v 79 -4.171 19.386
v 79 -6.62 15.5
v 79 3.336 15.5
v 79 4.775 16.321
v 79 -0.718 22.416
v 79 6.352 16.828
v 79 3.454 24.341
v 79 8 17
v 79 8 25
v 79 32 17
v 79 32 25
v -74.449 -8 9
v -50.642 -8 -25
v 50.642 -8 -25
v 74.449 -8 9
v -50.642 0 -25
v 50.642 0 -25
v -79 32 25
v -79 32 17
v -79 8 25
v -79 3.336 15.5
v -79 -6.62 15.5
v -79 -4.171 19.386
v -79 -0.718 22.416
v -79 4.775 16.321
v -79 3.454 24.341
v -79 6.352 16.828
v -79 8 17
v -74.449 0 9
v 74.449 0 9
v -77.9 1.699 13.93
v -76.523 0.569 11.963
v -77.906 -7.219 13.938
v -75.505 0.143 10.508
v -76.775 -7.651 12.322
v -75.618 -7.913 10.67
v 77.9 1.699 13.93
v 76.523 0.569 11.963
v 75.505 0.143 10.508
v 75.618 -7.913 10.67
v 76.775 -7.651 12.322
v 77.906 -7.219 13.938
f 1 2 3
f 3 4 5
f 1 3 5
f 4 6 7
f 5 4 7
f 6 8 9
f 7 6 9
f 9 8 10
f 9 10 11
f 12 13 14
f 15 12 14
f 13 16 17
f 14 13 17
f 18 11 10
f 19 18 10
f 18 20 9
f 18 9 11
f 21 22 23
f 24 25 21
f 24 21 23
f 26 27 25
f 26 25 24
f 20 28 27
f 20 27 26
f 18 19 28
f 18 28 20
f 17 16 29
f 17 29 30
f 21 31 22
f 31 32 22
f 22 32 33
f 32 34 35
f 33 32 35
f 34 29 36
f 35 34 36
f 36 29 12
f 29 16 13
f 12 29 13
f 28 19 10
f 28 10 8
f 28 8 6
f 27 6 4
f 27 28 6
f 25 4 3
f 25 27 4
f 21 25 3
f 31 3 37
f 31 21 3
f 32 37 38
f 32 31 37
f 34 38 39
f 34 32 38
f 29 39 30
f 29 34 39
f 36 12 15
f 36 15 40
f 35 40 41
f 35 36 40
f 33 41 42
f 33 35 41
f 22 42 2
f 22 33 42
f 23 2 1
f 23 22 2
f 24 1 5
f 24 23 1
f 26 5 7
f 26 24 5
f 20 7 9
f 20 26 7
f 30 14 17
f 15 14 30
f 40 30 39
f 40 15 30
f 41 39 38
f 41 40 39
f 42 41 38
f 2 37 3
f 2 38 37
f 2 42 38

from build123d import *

# Parameters (mm, degrees)
SKETCH1_W                    = 158
SKETCH1_H                    = 50
BASE_FLANGE1_DEPTH           = 8
EDGE_FLANGE1_STRIP_W         = 48
EDGE_FLANGE1_STRIP_H         = 8
EDGE_FLANGE1_STRIP_CUT_DEPTH = 158
EDGE_FLANGE1_DEPTH           = 158
CHAMFER1_SIZE                = 40.5
CHAMFER1_SIZE2               = 28.358405297
MIRROR2_START                = 55.822576735
MIRROR2_OUTLINE_W            = 53
MIRROR2_OUTLINE_H            = 13
MIRROR2_DEPTH                = 23.229845673


# Read off the part's stored shape, not the designer's step: Mirror2
# Sheet-metal steps are written as plain solids
with BuildPart() as part:
    # Sketch1 → Base-Flange1 (new body)
    with BuildSketch(Plane(origin=(0, 0, 0), x_dir=(1, 0, 0), z_dir=(0, 1, 0))):
        Rectangle(SKETCH1_W, SKETCH1_H)
    extrude(amount=-BASE_FLANGE1_DEPTH)

    # Edge-Flange1 strip (across the edge) → Edge-Flange1 strip cut (cut)
    with BuildSketch(Plane(origin=(-79, 0, 25), x_dir=(0, 0, -1), z_dir=(1, 0, 0))):
        with Locations((-8, -4)):
            Rectangle(EDGE_FLANGE1_STRIP_W, EDGE_FLANGE1_STRIP_H)
    extrude(amount=EDGE_FLANGE1_STRIP_CUT_DEPTH, mode=Mode.SUBTRACT)

    # Edge-Flange1 section (across the edge) → Edge-Flange1 (add)
    with BuildSketch(Plane(origin=(-79, 0, 25), x_dir=(0, 0, -1), z_dir=(1, 0, 0))):
        with BuildLine():
            Line((0, 8), (0, 32))
            Line((0, 32), (8, 32))
            Line((8, 32), (8, 8))
            ThreePointArc((8, 8), (10.343145751, 2.343145751), (16, 0))
            Line((16, 0), (16, -8))
            ThreePointArc((16, -8), (4.686291501, -3.313708499), (0, 8))
        make_face()
    extrude(amount=EDGE_FLANGE1_DEPTH)

    # Chamfer1
    chamfer1_edges = [part.edges().sort_by_distance(p)[0] for p in [
        (-79, -4, -25),
    ]]
    chamfer1_side = [part.faces().sort_by_distance(p)[0] for p in [
        (-79, -0.640312424, -8),
    ]]
    chamfer(chamfer1_edges, length=CHAMFER1_SIZE, length2=CHAMFER1_SIZE2, reference=chamfer1_side[0])

    # Mirror2 outline → Mirror2 (cut)
    with BuildSketch(Plane(origin=(0, 0, 0), x_dir=(0.5735764363510512, 0, 0.8191520442889882), z_dir=(0.8191520442889882, 0, -0.5735764363510512)).offset(MIRROR2_START)):
        with Locations((33.5, 1.5)):
            Rectangle(MIRROR2_OUTLINE_W, MIRROR2_OUTLINE_H)
    extrude(amount=MIRROR2_DEPTH, mode=Mode.SUBTRACT)


solid = part.part
